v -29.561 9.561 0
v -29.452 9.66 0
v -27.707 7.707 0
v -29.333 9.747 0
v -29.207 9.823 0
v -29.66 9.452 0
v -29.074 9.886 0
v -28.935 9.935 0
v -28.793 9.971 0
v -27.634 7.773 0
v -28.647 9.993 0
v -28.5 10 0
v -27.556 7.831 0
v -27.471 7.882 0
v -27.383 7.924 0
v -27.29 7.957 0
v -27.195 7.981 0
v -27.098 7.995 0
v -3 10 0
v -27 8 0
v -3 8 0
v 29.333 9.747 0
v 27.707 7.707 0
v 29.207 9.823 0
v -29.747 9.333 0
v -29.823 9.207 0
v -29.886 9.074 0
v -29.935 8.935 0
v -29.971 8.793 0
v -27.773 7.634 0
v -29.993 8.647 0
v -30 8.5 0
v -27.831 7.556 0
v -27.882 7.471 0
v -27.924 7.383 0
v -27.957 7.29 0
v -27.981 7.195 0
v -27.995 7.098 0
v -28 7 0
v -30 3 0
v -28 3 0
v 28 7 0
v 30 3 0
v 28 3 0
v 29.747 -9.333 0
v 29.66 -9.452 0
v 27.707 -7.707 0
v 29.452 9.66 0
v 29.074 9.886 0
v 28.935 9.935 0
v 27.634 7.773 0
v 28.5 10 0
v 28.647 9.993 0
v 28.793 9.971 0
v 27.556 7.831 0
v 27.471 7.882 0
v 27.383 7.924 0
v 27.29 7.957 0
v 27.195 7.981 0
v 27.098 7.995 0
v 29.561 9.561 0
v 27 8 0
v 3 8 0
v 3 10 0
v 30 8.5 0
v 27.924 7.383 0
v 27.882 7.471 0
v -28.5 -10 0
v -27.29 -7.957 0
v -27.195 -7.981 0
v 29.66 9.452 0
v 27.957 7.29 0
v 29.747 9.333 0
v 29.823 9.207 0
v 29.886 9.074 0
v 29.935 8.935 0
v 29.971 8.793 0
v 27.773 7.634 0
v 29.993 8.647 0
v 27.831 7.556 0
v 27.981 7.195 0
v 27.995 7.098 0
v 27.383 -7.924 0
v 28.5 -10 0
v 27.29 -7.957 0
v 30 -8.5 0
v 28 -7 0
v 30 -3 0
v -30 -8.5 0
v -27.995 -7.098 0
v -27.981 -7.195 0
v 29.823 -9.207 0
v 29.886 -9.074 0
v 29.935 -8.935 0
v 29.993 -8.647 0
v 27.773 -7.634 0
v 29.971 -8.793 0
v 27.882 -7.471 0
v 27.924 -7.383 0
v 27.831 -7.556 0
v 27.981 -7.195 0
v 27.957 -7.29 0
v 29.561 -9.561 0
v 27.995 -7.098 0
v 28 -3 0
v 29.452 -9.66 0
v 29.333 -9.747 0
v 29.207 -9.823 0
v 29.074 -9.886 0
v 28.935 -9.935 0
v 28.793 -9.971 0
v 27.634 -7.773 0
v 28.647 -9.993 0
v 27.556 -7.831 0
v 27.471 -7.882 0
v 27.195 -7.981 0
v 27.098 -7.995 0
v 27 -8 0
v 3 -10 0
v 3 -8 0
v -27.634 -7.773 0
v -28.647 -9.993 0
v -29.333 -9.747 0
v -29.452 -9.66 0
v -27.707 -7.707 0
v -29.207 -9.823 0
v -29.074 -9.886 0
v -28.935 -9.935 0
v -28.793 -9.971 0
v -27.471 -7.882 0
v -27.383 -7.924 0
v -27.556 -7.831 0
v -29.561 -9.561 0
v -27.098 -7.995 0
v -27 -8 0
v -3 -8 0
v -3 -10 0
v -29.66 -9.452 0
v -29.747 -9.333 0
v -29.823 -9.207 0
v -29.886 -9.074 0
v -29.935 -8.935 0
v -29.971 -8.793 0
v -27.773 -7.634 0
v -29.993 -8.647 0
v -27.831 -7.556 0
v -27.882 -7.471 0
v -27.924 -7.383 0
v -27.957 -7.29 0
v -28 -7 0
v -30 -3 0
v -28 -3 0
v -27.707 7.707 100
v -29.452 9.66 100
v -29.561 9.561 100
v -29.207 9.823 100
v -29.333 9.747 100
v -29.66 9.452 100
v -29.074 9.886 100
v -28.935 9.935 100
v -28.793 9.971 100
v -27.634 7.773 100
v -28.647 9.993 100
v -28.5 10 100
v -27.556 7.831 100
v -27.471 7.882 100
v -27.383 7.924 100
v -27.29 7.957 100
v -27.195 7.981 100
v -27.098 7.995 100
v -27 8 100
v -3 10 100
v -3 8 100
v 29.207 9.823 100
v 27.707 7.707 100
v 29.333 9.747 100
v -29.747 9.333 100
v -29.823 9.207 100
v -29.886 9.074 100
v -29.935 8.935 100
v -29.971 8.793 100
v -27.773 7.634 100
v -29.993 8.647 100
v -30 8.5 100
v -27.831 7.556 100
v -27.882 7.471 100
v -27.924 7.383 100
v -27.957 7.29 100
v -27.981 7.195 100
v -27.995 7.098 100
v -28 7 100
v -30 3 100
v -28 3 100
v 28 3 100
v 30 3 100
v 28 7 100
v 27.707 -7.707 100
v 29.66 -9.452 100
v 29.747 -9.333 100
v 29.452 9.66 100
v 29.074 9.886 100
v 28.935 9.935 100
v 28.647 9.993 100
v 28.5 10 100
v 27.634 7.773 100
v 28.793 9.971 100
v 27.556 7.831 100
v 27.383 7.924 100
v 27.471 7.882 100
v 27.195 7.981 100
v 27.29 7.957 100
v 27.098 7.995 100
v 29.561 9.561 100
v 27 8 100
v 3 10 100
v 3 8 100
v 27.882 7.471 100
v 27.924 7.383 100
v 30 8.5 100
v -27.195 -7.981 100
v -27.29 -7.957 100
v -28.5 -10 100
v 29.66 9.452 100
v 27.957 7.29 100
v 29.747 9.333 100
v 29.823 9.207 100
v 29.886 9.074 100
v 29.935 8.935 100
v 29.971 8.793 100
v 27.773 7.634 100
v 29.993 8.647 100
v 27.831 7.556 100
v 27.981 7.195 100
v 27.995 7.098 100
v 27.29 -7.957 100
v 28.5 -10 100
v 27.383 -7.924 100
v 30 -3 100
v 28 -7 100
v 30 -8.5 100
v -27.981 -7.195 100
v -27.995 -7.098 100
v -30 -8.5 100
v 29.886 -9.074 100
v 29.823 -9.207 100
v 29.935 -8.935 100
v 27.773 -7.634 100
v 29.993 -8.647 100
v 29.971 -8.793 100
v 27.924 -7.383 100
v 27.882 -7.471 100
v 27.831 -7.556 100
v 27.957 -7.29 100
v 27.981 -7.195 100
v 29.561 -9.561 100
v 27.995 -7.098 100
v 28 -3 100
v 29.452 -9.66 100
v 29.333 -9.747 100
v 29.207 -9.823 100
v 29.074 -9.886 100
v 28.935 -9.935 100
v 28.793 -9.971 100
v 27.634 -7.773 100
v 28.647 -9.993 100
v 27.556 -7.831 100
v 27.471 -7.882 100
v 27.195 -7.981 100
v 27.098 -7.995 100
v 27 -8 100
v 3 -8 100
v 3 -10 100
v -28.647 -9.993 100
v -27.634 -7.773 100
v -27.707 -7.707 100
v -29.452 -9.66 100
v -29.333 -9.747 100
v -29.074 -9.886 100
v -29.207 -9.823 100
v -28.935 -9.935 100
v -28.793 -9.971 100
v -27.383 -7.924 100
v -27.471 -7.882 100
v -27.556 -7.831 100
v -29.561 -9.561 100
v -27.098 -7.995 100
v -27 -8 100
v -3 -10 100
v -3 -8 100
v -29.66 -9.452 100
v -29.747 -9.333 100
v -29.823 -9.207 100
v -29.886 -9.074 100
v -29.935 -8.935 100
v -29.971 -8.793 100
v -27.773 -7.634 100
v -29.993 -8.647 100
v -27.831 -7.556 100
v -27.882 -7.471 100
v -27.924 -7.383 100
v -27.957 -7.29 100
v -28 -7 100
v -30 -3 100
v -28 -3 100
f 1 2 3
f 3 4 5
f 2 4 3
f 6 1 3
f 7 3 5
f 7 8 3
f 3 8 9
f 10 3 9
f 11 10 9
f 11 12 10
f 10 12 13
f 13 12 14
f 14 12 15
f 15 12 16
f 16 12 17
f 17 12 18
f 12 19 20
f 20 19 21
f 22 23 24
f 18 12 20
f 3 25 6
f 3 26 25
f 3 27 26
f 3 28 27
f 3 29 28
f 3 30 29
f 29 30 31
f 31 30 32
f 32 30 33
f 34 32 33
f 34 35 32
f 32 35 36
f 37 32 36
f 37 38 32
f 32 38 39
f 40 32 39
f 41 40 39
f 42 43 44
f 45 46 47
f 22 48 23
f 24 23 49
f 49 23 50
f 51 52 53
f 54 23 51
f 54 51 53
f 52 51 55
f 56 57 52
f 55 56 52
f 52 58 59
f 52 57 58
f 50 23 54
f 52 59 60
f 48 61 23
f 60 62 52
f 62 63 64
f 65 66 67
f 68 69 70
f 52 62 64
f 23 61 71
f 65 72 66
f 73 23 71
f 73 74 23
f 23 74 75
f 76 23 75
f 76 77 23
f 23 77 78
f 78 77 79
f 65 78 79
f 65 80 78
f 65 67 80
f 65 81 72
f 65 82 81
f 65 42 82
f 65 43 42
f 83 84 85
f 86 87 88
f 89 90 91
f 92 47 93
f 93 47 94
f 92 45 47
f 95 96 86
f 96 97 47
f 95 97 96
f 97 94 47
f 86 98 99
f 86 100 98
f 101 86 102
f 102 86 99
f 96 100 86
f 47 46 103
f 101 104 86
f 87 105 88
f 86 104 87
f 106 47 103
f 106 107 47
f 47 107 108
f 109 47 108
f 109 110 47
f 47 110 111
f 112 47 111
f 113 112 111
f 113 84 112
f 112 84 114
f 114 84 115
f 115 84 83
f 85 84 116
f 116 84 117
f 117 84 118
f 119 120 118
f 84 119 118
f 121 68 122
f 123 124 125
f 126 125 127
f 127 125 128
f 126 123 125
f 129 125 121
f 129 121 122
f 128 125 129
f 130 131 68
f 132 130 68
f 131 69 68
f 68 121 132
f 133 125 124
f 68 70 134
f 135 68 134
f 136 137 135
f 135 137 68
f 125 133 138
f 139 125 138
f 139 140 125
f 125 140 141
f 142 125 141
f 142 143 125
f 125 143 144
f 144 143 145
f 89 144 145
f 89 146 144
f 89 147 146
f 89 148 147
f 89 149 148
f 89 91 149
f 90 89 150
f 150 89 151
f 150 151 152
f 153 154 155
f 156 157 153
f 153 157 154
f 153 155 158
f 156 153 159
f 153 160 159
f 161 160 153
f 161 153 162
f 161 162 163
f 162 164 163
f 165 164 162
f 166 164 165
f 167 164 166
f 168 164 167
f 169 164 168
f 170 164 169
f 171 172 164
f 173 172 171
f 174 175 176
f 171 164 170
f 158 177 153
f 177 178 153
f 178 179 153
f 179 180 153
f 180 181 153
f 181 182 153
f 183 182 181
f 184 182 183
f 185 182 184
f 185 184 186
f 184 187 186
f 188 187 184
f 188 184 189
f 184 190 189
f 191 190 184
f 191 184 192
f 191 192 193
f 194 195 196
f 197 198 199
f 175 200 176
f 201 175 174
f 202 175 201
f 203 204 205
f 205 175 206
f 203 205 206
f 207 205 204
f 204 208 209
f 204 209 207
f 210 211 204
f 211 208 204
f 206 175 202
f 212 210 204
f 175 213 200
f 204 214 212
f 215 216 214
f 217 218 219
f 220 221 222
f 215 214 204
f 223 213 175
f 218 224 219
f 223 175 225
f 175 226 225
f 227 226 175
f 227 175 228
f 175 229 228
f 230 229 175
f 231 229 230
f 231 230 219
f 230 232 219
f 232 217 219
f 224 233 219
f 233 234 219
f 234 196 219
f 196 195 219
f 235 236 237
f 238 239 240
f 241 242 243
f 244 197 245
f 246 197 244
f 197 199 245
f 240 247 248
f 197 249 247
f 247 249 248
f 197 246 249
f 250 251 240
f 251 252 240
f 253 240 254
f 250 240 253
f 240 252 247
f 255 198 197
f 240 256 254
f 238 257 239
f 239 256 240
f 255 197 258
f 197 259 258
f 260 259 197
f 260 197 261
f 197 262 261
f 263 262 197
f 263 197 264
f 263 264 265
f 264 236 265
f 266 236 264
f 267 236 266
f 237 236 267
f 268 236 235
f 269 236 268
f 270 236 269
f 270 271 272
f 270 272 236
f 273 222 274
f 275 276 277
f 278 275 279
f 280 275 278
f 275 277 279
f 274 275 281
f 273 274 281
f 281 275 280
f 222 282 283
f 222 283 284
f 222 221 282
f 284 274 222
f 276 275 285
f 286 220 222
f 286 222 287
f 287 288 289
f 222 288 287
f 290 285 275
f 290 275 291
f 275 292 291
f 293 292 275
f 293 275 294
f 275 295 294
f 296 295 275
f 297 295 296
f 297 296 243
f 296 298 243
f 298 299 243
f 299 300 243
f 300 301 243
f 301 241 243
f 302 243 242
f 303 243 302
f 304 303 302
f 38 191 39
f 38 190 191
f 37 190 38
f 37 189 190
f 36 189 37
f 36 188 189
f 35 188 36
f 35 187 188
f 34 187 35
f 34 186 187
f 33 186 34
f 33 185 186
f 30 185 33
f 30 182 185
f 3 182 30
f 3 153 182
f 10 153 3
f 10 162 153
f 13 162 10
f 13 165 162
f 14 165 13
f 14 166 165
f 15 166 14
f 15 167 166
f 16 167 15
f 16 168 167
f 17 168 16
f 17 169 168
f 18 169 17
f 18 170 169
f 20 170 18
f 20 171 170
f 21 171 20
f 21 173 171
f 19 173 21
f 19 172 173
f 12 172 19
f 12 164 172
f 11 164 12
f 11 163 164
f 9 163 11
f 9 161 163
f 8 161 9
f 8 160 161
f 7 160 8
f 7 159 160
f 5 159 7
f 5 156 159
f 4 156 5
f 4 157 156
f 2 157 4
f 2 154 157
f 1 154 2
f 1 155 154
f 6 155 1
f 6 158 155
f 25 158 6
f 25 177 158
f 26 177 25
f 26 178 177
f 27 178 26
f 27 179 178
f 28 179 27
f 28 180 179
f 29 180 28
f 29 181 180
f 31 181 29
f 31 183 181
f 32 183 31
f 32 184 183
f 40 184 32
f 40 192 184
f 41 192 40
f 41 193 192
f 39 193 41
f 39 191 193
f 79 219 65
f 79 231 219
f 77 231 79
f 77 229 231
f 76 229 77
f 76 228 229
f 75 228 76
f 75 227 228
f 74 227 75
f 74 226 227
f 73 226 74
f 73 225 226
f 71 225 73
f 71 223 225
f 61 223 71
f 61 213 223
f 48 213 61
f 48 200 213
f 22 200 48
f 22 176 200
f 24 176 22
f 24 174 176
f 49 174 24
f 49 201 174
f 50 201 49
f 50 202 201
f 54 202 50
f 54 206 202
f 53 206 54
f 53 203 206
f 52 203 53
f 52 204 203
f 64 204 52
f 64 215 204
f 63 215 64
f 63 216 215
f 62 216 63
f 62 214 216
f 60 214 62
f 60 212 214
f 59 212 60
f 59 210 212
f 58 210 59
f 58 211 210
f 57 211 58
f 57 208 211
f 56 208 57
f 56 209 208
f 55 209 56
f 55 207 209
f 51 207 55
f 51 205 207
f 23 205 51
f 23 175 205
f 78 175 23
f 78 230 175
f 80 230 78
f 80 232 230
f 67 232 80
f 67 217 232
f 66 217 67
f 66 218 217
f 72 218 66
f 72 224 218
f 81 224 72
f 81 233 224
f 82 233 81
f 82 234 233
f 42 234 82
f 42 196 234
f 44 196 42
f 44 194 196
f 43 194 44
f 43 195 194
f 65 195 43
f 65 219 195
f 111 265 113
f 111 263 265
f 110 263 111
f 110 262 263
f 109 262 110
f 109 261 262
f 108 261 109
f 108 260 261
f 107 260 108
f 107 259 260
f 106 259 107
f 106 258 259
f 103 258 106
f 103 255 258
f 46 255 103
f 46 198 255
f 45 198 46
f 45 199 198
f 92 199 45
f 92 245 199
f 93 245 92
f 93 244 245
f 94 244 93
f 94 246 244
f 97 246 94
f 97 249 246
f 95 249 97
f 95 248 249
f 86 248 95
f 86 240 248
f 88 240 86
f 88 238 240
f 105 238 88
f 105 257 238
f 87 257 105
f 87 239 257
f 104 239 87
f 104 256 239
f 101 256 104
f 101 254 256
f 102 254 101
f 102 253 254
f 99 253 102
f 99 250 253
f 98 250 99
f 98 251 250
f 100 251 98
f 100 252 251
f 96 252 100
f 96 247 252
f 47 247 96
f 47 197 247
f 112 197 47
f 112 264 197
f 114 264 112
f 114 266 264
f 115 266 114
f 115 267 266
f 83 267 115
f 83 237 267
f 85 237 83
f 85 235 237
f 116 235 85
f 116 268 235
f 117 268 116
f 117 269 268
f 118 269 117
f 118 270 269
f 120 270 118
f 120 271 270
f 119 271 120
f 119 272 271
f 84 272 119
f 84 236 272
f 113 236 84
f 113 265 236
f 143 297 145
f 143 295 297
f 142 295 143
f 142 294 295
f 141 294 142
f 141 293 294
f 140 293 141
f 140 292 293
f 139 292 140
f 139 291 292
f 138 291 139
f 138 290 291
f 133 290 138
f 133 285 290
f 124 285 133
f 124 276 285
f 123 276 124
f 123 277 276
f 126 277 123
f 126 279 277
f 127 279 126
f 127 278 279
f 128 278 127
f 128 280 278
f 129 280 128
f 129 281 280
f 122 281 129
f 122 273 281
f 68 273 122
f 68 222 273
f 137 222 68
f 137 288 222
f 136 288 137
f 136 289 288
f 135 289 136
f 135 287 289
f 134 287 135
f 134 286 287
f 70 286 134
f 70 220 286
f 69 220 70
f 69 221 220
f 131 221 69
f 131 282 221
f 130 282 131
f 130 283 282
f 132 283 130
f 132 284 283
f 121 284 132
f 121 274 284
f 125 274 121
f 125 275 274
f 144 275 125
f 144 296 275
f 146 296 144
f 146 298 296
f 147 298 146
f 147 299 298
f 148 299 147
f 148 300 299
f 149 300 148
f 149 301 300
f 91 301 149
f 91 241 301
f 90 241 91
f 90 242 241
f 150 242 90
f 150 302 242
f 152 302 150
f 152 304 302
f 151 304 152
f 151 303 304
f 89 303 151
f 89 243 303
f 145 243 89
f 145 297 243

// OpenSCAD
$fn = 64;

length = 100;
w = 60;
h = 20;

slot = 6;          // slot opening width
slot_depth = 6;    // depth of slot cut from each face
wall = 2;          // outer wall thickness
core_r = 4;        // central bore radius
corner_r = 1.5;    // outer corner radius

module rounded_rect_2d(w, h, r) {
    r2 = min(r, min(w, h)/2);
    hull() {
        translate([ w/2 - r2,  h/2 - r2]) circle(r=r2);
        translate([-w/2 + r2,  h/2 - r2]) circle(r=r2);
        translate([-w/2 + r2, -h/2 + r2]) circle(r=r2);
        translate([ w/2 - r2, -h/2 + r2]) circle(r=r2);
    }
}

module extrusion_profile_2060_2d() {
    difference() {
        // Outer body
        rounded_rect_2d(w, h, corner_r);

        // Inner cavity (lightening)
        rounded_rect_2d(w - 2*wall, h - 2*wall, max(0, corner_r - 0.5));

        // Central bore
        circle(r=core_r);

        // T-slots (simple rectangular approximations)
        // Long sides (top/bottom)
        translate([0,  h/2 - slot_depth/2]) square([slot, slot_depth], center=true);
        translate([0, -h/2 + slot_depth/2]) square([slot, slot_depth], center=true);

        // Short sides (left/right)
        translate([ w/2 - slot_depth/2, 0]) square([slot_depth, slot], center=true);
        translate([-w/2 + slot_depth/2, 0]) square([slot_depth, slot], center=true);

        // Internal webs (keep some structure by cutting channels)
        // Long internal channels
        translate([0, 0]) square([w - 2*wall - 10, 4], center=true);
        // Short internal channels
        translate([0, 0]) square([4, h - 2*wall - 6], center=true);
    }
}

linear_extrude(height=length, center=false, convexity=10)
    extrusion_profile_2060_2d();
